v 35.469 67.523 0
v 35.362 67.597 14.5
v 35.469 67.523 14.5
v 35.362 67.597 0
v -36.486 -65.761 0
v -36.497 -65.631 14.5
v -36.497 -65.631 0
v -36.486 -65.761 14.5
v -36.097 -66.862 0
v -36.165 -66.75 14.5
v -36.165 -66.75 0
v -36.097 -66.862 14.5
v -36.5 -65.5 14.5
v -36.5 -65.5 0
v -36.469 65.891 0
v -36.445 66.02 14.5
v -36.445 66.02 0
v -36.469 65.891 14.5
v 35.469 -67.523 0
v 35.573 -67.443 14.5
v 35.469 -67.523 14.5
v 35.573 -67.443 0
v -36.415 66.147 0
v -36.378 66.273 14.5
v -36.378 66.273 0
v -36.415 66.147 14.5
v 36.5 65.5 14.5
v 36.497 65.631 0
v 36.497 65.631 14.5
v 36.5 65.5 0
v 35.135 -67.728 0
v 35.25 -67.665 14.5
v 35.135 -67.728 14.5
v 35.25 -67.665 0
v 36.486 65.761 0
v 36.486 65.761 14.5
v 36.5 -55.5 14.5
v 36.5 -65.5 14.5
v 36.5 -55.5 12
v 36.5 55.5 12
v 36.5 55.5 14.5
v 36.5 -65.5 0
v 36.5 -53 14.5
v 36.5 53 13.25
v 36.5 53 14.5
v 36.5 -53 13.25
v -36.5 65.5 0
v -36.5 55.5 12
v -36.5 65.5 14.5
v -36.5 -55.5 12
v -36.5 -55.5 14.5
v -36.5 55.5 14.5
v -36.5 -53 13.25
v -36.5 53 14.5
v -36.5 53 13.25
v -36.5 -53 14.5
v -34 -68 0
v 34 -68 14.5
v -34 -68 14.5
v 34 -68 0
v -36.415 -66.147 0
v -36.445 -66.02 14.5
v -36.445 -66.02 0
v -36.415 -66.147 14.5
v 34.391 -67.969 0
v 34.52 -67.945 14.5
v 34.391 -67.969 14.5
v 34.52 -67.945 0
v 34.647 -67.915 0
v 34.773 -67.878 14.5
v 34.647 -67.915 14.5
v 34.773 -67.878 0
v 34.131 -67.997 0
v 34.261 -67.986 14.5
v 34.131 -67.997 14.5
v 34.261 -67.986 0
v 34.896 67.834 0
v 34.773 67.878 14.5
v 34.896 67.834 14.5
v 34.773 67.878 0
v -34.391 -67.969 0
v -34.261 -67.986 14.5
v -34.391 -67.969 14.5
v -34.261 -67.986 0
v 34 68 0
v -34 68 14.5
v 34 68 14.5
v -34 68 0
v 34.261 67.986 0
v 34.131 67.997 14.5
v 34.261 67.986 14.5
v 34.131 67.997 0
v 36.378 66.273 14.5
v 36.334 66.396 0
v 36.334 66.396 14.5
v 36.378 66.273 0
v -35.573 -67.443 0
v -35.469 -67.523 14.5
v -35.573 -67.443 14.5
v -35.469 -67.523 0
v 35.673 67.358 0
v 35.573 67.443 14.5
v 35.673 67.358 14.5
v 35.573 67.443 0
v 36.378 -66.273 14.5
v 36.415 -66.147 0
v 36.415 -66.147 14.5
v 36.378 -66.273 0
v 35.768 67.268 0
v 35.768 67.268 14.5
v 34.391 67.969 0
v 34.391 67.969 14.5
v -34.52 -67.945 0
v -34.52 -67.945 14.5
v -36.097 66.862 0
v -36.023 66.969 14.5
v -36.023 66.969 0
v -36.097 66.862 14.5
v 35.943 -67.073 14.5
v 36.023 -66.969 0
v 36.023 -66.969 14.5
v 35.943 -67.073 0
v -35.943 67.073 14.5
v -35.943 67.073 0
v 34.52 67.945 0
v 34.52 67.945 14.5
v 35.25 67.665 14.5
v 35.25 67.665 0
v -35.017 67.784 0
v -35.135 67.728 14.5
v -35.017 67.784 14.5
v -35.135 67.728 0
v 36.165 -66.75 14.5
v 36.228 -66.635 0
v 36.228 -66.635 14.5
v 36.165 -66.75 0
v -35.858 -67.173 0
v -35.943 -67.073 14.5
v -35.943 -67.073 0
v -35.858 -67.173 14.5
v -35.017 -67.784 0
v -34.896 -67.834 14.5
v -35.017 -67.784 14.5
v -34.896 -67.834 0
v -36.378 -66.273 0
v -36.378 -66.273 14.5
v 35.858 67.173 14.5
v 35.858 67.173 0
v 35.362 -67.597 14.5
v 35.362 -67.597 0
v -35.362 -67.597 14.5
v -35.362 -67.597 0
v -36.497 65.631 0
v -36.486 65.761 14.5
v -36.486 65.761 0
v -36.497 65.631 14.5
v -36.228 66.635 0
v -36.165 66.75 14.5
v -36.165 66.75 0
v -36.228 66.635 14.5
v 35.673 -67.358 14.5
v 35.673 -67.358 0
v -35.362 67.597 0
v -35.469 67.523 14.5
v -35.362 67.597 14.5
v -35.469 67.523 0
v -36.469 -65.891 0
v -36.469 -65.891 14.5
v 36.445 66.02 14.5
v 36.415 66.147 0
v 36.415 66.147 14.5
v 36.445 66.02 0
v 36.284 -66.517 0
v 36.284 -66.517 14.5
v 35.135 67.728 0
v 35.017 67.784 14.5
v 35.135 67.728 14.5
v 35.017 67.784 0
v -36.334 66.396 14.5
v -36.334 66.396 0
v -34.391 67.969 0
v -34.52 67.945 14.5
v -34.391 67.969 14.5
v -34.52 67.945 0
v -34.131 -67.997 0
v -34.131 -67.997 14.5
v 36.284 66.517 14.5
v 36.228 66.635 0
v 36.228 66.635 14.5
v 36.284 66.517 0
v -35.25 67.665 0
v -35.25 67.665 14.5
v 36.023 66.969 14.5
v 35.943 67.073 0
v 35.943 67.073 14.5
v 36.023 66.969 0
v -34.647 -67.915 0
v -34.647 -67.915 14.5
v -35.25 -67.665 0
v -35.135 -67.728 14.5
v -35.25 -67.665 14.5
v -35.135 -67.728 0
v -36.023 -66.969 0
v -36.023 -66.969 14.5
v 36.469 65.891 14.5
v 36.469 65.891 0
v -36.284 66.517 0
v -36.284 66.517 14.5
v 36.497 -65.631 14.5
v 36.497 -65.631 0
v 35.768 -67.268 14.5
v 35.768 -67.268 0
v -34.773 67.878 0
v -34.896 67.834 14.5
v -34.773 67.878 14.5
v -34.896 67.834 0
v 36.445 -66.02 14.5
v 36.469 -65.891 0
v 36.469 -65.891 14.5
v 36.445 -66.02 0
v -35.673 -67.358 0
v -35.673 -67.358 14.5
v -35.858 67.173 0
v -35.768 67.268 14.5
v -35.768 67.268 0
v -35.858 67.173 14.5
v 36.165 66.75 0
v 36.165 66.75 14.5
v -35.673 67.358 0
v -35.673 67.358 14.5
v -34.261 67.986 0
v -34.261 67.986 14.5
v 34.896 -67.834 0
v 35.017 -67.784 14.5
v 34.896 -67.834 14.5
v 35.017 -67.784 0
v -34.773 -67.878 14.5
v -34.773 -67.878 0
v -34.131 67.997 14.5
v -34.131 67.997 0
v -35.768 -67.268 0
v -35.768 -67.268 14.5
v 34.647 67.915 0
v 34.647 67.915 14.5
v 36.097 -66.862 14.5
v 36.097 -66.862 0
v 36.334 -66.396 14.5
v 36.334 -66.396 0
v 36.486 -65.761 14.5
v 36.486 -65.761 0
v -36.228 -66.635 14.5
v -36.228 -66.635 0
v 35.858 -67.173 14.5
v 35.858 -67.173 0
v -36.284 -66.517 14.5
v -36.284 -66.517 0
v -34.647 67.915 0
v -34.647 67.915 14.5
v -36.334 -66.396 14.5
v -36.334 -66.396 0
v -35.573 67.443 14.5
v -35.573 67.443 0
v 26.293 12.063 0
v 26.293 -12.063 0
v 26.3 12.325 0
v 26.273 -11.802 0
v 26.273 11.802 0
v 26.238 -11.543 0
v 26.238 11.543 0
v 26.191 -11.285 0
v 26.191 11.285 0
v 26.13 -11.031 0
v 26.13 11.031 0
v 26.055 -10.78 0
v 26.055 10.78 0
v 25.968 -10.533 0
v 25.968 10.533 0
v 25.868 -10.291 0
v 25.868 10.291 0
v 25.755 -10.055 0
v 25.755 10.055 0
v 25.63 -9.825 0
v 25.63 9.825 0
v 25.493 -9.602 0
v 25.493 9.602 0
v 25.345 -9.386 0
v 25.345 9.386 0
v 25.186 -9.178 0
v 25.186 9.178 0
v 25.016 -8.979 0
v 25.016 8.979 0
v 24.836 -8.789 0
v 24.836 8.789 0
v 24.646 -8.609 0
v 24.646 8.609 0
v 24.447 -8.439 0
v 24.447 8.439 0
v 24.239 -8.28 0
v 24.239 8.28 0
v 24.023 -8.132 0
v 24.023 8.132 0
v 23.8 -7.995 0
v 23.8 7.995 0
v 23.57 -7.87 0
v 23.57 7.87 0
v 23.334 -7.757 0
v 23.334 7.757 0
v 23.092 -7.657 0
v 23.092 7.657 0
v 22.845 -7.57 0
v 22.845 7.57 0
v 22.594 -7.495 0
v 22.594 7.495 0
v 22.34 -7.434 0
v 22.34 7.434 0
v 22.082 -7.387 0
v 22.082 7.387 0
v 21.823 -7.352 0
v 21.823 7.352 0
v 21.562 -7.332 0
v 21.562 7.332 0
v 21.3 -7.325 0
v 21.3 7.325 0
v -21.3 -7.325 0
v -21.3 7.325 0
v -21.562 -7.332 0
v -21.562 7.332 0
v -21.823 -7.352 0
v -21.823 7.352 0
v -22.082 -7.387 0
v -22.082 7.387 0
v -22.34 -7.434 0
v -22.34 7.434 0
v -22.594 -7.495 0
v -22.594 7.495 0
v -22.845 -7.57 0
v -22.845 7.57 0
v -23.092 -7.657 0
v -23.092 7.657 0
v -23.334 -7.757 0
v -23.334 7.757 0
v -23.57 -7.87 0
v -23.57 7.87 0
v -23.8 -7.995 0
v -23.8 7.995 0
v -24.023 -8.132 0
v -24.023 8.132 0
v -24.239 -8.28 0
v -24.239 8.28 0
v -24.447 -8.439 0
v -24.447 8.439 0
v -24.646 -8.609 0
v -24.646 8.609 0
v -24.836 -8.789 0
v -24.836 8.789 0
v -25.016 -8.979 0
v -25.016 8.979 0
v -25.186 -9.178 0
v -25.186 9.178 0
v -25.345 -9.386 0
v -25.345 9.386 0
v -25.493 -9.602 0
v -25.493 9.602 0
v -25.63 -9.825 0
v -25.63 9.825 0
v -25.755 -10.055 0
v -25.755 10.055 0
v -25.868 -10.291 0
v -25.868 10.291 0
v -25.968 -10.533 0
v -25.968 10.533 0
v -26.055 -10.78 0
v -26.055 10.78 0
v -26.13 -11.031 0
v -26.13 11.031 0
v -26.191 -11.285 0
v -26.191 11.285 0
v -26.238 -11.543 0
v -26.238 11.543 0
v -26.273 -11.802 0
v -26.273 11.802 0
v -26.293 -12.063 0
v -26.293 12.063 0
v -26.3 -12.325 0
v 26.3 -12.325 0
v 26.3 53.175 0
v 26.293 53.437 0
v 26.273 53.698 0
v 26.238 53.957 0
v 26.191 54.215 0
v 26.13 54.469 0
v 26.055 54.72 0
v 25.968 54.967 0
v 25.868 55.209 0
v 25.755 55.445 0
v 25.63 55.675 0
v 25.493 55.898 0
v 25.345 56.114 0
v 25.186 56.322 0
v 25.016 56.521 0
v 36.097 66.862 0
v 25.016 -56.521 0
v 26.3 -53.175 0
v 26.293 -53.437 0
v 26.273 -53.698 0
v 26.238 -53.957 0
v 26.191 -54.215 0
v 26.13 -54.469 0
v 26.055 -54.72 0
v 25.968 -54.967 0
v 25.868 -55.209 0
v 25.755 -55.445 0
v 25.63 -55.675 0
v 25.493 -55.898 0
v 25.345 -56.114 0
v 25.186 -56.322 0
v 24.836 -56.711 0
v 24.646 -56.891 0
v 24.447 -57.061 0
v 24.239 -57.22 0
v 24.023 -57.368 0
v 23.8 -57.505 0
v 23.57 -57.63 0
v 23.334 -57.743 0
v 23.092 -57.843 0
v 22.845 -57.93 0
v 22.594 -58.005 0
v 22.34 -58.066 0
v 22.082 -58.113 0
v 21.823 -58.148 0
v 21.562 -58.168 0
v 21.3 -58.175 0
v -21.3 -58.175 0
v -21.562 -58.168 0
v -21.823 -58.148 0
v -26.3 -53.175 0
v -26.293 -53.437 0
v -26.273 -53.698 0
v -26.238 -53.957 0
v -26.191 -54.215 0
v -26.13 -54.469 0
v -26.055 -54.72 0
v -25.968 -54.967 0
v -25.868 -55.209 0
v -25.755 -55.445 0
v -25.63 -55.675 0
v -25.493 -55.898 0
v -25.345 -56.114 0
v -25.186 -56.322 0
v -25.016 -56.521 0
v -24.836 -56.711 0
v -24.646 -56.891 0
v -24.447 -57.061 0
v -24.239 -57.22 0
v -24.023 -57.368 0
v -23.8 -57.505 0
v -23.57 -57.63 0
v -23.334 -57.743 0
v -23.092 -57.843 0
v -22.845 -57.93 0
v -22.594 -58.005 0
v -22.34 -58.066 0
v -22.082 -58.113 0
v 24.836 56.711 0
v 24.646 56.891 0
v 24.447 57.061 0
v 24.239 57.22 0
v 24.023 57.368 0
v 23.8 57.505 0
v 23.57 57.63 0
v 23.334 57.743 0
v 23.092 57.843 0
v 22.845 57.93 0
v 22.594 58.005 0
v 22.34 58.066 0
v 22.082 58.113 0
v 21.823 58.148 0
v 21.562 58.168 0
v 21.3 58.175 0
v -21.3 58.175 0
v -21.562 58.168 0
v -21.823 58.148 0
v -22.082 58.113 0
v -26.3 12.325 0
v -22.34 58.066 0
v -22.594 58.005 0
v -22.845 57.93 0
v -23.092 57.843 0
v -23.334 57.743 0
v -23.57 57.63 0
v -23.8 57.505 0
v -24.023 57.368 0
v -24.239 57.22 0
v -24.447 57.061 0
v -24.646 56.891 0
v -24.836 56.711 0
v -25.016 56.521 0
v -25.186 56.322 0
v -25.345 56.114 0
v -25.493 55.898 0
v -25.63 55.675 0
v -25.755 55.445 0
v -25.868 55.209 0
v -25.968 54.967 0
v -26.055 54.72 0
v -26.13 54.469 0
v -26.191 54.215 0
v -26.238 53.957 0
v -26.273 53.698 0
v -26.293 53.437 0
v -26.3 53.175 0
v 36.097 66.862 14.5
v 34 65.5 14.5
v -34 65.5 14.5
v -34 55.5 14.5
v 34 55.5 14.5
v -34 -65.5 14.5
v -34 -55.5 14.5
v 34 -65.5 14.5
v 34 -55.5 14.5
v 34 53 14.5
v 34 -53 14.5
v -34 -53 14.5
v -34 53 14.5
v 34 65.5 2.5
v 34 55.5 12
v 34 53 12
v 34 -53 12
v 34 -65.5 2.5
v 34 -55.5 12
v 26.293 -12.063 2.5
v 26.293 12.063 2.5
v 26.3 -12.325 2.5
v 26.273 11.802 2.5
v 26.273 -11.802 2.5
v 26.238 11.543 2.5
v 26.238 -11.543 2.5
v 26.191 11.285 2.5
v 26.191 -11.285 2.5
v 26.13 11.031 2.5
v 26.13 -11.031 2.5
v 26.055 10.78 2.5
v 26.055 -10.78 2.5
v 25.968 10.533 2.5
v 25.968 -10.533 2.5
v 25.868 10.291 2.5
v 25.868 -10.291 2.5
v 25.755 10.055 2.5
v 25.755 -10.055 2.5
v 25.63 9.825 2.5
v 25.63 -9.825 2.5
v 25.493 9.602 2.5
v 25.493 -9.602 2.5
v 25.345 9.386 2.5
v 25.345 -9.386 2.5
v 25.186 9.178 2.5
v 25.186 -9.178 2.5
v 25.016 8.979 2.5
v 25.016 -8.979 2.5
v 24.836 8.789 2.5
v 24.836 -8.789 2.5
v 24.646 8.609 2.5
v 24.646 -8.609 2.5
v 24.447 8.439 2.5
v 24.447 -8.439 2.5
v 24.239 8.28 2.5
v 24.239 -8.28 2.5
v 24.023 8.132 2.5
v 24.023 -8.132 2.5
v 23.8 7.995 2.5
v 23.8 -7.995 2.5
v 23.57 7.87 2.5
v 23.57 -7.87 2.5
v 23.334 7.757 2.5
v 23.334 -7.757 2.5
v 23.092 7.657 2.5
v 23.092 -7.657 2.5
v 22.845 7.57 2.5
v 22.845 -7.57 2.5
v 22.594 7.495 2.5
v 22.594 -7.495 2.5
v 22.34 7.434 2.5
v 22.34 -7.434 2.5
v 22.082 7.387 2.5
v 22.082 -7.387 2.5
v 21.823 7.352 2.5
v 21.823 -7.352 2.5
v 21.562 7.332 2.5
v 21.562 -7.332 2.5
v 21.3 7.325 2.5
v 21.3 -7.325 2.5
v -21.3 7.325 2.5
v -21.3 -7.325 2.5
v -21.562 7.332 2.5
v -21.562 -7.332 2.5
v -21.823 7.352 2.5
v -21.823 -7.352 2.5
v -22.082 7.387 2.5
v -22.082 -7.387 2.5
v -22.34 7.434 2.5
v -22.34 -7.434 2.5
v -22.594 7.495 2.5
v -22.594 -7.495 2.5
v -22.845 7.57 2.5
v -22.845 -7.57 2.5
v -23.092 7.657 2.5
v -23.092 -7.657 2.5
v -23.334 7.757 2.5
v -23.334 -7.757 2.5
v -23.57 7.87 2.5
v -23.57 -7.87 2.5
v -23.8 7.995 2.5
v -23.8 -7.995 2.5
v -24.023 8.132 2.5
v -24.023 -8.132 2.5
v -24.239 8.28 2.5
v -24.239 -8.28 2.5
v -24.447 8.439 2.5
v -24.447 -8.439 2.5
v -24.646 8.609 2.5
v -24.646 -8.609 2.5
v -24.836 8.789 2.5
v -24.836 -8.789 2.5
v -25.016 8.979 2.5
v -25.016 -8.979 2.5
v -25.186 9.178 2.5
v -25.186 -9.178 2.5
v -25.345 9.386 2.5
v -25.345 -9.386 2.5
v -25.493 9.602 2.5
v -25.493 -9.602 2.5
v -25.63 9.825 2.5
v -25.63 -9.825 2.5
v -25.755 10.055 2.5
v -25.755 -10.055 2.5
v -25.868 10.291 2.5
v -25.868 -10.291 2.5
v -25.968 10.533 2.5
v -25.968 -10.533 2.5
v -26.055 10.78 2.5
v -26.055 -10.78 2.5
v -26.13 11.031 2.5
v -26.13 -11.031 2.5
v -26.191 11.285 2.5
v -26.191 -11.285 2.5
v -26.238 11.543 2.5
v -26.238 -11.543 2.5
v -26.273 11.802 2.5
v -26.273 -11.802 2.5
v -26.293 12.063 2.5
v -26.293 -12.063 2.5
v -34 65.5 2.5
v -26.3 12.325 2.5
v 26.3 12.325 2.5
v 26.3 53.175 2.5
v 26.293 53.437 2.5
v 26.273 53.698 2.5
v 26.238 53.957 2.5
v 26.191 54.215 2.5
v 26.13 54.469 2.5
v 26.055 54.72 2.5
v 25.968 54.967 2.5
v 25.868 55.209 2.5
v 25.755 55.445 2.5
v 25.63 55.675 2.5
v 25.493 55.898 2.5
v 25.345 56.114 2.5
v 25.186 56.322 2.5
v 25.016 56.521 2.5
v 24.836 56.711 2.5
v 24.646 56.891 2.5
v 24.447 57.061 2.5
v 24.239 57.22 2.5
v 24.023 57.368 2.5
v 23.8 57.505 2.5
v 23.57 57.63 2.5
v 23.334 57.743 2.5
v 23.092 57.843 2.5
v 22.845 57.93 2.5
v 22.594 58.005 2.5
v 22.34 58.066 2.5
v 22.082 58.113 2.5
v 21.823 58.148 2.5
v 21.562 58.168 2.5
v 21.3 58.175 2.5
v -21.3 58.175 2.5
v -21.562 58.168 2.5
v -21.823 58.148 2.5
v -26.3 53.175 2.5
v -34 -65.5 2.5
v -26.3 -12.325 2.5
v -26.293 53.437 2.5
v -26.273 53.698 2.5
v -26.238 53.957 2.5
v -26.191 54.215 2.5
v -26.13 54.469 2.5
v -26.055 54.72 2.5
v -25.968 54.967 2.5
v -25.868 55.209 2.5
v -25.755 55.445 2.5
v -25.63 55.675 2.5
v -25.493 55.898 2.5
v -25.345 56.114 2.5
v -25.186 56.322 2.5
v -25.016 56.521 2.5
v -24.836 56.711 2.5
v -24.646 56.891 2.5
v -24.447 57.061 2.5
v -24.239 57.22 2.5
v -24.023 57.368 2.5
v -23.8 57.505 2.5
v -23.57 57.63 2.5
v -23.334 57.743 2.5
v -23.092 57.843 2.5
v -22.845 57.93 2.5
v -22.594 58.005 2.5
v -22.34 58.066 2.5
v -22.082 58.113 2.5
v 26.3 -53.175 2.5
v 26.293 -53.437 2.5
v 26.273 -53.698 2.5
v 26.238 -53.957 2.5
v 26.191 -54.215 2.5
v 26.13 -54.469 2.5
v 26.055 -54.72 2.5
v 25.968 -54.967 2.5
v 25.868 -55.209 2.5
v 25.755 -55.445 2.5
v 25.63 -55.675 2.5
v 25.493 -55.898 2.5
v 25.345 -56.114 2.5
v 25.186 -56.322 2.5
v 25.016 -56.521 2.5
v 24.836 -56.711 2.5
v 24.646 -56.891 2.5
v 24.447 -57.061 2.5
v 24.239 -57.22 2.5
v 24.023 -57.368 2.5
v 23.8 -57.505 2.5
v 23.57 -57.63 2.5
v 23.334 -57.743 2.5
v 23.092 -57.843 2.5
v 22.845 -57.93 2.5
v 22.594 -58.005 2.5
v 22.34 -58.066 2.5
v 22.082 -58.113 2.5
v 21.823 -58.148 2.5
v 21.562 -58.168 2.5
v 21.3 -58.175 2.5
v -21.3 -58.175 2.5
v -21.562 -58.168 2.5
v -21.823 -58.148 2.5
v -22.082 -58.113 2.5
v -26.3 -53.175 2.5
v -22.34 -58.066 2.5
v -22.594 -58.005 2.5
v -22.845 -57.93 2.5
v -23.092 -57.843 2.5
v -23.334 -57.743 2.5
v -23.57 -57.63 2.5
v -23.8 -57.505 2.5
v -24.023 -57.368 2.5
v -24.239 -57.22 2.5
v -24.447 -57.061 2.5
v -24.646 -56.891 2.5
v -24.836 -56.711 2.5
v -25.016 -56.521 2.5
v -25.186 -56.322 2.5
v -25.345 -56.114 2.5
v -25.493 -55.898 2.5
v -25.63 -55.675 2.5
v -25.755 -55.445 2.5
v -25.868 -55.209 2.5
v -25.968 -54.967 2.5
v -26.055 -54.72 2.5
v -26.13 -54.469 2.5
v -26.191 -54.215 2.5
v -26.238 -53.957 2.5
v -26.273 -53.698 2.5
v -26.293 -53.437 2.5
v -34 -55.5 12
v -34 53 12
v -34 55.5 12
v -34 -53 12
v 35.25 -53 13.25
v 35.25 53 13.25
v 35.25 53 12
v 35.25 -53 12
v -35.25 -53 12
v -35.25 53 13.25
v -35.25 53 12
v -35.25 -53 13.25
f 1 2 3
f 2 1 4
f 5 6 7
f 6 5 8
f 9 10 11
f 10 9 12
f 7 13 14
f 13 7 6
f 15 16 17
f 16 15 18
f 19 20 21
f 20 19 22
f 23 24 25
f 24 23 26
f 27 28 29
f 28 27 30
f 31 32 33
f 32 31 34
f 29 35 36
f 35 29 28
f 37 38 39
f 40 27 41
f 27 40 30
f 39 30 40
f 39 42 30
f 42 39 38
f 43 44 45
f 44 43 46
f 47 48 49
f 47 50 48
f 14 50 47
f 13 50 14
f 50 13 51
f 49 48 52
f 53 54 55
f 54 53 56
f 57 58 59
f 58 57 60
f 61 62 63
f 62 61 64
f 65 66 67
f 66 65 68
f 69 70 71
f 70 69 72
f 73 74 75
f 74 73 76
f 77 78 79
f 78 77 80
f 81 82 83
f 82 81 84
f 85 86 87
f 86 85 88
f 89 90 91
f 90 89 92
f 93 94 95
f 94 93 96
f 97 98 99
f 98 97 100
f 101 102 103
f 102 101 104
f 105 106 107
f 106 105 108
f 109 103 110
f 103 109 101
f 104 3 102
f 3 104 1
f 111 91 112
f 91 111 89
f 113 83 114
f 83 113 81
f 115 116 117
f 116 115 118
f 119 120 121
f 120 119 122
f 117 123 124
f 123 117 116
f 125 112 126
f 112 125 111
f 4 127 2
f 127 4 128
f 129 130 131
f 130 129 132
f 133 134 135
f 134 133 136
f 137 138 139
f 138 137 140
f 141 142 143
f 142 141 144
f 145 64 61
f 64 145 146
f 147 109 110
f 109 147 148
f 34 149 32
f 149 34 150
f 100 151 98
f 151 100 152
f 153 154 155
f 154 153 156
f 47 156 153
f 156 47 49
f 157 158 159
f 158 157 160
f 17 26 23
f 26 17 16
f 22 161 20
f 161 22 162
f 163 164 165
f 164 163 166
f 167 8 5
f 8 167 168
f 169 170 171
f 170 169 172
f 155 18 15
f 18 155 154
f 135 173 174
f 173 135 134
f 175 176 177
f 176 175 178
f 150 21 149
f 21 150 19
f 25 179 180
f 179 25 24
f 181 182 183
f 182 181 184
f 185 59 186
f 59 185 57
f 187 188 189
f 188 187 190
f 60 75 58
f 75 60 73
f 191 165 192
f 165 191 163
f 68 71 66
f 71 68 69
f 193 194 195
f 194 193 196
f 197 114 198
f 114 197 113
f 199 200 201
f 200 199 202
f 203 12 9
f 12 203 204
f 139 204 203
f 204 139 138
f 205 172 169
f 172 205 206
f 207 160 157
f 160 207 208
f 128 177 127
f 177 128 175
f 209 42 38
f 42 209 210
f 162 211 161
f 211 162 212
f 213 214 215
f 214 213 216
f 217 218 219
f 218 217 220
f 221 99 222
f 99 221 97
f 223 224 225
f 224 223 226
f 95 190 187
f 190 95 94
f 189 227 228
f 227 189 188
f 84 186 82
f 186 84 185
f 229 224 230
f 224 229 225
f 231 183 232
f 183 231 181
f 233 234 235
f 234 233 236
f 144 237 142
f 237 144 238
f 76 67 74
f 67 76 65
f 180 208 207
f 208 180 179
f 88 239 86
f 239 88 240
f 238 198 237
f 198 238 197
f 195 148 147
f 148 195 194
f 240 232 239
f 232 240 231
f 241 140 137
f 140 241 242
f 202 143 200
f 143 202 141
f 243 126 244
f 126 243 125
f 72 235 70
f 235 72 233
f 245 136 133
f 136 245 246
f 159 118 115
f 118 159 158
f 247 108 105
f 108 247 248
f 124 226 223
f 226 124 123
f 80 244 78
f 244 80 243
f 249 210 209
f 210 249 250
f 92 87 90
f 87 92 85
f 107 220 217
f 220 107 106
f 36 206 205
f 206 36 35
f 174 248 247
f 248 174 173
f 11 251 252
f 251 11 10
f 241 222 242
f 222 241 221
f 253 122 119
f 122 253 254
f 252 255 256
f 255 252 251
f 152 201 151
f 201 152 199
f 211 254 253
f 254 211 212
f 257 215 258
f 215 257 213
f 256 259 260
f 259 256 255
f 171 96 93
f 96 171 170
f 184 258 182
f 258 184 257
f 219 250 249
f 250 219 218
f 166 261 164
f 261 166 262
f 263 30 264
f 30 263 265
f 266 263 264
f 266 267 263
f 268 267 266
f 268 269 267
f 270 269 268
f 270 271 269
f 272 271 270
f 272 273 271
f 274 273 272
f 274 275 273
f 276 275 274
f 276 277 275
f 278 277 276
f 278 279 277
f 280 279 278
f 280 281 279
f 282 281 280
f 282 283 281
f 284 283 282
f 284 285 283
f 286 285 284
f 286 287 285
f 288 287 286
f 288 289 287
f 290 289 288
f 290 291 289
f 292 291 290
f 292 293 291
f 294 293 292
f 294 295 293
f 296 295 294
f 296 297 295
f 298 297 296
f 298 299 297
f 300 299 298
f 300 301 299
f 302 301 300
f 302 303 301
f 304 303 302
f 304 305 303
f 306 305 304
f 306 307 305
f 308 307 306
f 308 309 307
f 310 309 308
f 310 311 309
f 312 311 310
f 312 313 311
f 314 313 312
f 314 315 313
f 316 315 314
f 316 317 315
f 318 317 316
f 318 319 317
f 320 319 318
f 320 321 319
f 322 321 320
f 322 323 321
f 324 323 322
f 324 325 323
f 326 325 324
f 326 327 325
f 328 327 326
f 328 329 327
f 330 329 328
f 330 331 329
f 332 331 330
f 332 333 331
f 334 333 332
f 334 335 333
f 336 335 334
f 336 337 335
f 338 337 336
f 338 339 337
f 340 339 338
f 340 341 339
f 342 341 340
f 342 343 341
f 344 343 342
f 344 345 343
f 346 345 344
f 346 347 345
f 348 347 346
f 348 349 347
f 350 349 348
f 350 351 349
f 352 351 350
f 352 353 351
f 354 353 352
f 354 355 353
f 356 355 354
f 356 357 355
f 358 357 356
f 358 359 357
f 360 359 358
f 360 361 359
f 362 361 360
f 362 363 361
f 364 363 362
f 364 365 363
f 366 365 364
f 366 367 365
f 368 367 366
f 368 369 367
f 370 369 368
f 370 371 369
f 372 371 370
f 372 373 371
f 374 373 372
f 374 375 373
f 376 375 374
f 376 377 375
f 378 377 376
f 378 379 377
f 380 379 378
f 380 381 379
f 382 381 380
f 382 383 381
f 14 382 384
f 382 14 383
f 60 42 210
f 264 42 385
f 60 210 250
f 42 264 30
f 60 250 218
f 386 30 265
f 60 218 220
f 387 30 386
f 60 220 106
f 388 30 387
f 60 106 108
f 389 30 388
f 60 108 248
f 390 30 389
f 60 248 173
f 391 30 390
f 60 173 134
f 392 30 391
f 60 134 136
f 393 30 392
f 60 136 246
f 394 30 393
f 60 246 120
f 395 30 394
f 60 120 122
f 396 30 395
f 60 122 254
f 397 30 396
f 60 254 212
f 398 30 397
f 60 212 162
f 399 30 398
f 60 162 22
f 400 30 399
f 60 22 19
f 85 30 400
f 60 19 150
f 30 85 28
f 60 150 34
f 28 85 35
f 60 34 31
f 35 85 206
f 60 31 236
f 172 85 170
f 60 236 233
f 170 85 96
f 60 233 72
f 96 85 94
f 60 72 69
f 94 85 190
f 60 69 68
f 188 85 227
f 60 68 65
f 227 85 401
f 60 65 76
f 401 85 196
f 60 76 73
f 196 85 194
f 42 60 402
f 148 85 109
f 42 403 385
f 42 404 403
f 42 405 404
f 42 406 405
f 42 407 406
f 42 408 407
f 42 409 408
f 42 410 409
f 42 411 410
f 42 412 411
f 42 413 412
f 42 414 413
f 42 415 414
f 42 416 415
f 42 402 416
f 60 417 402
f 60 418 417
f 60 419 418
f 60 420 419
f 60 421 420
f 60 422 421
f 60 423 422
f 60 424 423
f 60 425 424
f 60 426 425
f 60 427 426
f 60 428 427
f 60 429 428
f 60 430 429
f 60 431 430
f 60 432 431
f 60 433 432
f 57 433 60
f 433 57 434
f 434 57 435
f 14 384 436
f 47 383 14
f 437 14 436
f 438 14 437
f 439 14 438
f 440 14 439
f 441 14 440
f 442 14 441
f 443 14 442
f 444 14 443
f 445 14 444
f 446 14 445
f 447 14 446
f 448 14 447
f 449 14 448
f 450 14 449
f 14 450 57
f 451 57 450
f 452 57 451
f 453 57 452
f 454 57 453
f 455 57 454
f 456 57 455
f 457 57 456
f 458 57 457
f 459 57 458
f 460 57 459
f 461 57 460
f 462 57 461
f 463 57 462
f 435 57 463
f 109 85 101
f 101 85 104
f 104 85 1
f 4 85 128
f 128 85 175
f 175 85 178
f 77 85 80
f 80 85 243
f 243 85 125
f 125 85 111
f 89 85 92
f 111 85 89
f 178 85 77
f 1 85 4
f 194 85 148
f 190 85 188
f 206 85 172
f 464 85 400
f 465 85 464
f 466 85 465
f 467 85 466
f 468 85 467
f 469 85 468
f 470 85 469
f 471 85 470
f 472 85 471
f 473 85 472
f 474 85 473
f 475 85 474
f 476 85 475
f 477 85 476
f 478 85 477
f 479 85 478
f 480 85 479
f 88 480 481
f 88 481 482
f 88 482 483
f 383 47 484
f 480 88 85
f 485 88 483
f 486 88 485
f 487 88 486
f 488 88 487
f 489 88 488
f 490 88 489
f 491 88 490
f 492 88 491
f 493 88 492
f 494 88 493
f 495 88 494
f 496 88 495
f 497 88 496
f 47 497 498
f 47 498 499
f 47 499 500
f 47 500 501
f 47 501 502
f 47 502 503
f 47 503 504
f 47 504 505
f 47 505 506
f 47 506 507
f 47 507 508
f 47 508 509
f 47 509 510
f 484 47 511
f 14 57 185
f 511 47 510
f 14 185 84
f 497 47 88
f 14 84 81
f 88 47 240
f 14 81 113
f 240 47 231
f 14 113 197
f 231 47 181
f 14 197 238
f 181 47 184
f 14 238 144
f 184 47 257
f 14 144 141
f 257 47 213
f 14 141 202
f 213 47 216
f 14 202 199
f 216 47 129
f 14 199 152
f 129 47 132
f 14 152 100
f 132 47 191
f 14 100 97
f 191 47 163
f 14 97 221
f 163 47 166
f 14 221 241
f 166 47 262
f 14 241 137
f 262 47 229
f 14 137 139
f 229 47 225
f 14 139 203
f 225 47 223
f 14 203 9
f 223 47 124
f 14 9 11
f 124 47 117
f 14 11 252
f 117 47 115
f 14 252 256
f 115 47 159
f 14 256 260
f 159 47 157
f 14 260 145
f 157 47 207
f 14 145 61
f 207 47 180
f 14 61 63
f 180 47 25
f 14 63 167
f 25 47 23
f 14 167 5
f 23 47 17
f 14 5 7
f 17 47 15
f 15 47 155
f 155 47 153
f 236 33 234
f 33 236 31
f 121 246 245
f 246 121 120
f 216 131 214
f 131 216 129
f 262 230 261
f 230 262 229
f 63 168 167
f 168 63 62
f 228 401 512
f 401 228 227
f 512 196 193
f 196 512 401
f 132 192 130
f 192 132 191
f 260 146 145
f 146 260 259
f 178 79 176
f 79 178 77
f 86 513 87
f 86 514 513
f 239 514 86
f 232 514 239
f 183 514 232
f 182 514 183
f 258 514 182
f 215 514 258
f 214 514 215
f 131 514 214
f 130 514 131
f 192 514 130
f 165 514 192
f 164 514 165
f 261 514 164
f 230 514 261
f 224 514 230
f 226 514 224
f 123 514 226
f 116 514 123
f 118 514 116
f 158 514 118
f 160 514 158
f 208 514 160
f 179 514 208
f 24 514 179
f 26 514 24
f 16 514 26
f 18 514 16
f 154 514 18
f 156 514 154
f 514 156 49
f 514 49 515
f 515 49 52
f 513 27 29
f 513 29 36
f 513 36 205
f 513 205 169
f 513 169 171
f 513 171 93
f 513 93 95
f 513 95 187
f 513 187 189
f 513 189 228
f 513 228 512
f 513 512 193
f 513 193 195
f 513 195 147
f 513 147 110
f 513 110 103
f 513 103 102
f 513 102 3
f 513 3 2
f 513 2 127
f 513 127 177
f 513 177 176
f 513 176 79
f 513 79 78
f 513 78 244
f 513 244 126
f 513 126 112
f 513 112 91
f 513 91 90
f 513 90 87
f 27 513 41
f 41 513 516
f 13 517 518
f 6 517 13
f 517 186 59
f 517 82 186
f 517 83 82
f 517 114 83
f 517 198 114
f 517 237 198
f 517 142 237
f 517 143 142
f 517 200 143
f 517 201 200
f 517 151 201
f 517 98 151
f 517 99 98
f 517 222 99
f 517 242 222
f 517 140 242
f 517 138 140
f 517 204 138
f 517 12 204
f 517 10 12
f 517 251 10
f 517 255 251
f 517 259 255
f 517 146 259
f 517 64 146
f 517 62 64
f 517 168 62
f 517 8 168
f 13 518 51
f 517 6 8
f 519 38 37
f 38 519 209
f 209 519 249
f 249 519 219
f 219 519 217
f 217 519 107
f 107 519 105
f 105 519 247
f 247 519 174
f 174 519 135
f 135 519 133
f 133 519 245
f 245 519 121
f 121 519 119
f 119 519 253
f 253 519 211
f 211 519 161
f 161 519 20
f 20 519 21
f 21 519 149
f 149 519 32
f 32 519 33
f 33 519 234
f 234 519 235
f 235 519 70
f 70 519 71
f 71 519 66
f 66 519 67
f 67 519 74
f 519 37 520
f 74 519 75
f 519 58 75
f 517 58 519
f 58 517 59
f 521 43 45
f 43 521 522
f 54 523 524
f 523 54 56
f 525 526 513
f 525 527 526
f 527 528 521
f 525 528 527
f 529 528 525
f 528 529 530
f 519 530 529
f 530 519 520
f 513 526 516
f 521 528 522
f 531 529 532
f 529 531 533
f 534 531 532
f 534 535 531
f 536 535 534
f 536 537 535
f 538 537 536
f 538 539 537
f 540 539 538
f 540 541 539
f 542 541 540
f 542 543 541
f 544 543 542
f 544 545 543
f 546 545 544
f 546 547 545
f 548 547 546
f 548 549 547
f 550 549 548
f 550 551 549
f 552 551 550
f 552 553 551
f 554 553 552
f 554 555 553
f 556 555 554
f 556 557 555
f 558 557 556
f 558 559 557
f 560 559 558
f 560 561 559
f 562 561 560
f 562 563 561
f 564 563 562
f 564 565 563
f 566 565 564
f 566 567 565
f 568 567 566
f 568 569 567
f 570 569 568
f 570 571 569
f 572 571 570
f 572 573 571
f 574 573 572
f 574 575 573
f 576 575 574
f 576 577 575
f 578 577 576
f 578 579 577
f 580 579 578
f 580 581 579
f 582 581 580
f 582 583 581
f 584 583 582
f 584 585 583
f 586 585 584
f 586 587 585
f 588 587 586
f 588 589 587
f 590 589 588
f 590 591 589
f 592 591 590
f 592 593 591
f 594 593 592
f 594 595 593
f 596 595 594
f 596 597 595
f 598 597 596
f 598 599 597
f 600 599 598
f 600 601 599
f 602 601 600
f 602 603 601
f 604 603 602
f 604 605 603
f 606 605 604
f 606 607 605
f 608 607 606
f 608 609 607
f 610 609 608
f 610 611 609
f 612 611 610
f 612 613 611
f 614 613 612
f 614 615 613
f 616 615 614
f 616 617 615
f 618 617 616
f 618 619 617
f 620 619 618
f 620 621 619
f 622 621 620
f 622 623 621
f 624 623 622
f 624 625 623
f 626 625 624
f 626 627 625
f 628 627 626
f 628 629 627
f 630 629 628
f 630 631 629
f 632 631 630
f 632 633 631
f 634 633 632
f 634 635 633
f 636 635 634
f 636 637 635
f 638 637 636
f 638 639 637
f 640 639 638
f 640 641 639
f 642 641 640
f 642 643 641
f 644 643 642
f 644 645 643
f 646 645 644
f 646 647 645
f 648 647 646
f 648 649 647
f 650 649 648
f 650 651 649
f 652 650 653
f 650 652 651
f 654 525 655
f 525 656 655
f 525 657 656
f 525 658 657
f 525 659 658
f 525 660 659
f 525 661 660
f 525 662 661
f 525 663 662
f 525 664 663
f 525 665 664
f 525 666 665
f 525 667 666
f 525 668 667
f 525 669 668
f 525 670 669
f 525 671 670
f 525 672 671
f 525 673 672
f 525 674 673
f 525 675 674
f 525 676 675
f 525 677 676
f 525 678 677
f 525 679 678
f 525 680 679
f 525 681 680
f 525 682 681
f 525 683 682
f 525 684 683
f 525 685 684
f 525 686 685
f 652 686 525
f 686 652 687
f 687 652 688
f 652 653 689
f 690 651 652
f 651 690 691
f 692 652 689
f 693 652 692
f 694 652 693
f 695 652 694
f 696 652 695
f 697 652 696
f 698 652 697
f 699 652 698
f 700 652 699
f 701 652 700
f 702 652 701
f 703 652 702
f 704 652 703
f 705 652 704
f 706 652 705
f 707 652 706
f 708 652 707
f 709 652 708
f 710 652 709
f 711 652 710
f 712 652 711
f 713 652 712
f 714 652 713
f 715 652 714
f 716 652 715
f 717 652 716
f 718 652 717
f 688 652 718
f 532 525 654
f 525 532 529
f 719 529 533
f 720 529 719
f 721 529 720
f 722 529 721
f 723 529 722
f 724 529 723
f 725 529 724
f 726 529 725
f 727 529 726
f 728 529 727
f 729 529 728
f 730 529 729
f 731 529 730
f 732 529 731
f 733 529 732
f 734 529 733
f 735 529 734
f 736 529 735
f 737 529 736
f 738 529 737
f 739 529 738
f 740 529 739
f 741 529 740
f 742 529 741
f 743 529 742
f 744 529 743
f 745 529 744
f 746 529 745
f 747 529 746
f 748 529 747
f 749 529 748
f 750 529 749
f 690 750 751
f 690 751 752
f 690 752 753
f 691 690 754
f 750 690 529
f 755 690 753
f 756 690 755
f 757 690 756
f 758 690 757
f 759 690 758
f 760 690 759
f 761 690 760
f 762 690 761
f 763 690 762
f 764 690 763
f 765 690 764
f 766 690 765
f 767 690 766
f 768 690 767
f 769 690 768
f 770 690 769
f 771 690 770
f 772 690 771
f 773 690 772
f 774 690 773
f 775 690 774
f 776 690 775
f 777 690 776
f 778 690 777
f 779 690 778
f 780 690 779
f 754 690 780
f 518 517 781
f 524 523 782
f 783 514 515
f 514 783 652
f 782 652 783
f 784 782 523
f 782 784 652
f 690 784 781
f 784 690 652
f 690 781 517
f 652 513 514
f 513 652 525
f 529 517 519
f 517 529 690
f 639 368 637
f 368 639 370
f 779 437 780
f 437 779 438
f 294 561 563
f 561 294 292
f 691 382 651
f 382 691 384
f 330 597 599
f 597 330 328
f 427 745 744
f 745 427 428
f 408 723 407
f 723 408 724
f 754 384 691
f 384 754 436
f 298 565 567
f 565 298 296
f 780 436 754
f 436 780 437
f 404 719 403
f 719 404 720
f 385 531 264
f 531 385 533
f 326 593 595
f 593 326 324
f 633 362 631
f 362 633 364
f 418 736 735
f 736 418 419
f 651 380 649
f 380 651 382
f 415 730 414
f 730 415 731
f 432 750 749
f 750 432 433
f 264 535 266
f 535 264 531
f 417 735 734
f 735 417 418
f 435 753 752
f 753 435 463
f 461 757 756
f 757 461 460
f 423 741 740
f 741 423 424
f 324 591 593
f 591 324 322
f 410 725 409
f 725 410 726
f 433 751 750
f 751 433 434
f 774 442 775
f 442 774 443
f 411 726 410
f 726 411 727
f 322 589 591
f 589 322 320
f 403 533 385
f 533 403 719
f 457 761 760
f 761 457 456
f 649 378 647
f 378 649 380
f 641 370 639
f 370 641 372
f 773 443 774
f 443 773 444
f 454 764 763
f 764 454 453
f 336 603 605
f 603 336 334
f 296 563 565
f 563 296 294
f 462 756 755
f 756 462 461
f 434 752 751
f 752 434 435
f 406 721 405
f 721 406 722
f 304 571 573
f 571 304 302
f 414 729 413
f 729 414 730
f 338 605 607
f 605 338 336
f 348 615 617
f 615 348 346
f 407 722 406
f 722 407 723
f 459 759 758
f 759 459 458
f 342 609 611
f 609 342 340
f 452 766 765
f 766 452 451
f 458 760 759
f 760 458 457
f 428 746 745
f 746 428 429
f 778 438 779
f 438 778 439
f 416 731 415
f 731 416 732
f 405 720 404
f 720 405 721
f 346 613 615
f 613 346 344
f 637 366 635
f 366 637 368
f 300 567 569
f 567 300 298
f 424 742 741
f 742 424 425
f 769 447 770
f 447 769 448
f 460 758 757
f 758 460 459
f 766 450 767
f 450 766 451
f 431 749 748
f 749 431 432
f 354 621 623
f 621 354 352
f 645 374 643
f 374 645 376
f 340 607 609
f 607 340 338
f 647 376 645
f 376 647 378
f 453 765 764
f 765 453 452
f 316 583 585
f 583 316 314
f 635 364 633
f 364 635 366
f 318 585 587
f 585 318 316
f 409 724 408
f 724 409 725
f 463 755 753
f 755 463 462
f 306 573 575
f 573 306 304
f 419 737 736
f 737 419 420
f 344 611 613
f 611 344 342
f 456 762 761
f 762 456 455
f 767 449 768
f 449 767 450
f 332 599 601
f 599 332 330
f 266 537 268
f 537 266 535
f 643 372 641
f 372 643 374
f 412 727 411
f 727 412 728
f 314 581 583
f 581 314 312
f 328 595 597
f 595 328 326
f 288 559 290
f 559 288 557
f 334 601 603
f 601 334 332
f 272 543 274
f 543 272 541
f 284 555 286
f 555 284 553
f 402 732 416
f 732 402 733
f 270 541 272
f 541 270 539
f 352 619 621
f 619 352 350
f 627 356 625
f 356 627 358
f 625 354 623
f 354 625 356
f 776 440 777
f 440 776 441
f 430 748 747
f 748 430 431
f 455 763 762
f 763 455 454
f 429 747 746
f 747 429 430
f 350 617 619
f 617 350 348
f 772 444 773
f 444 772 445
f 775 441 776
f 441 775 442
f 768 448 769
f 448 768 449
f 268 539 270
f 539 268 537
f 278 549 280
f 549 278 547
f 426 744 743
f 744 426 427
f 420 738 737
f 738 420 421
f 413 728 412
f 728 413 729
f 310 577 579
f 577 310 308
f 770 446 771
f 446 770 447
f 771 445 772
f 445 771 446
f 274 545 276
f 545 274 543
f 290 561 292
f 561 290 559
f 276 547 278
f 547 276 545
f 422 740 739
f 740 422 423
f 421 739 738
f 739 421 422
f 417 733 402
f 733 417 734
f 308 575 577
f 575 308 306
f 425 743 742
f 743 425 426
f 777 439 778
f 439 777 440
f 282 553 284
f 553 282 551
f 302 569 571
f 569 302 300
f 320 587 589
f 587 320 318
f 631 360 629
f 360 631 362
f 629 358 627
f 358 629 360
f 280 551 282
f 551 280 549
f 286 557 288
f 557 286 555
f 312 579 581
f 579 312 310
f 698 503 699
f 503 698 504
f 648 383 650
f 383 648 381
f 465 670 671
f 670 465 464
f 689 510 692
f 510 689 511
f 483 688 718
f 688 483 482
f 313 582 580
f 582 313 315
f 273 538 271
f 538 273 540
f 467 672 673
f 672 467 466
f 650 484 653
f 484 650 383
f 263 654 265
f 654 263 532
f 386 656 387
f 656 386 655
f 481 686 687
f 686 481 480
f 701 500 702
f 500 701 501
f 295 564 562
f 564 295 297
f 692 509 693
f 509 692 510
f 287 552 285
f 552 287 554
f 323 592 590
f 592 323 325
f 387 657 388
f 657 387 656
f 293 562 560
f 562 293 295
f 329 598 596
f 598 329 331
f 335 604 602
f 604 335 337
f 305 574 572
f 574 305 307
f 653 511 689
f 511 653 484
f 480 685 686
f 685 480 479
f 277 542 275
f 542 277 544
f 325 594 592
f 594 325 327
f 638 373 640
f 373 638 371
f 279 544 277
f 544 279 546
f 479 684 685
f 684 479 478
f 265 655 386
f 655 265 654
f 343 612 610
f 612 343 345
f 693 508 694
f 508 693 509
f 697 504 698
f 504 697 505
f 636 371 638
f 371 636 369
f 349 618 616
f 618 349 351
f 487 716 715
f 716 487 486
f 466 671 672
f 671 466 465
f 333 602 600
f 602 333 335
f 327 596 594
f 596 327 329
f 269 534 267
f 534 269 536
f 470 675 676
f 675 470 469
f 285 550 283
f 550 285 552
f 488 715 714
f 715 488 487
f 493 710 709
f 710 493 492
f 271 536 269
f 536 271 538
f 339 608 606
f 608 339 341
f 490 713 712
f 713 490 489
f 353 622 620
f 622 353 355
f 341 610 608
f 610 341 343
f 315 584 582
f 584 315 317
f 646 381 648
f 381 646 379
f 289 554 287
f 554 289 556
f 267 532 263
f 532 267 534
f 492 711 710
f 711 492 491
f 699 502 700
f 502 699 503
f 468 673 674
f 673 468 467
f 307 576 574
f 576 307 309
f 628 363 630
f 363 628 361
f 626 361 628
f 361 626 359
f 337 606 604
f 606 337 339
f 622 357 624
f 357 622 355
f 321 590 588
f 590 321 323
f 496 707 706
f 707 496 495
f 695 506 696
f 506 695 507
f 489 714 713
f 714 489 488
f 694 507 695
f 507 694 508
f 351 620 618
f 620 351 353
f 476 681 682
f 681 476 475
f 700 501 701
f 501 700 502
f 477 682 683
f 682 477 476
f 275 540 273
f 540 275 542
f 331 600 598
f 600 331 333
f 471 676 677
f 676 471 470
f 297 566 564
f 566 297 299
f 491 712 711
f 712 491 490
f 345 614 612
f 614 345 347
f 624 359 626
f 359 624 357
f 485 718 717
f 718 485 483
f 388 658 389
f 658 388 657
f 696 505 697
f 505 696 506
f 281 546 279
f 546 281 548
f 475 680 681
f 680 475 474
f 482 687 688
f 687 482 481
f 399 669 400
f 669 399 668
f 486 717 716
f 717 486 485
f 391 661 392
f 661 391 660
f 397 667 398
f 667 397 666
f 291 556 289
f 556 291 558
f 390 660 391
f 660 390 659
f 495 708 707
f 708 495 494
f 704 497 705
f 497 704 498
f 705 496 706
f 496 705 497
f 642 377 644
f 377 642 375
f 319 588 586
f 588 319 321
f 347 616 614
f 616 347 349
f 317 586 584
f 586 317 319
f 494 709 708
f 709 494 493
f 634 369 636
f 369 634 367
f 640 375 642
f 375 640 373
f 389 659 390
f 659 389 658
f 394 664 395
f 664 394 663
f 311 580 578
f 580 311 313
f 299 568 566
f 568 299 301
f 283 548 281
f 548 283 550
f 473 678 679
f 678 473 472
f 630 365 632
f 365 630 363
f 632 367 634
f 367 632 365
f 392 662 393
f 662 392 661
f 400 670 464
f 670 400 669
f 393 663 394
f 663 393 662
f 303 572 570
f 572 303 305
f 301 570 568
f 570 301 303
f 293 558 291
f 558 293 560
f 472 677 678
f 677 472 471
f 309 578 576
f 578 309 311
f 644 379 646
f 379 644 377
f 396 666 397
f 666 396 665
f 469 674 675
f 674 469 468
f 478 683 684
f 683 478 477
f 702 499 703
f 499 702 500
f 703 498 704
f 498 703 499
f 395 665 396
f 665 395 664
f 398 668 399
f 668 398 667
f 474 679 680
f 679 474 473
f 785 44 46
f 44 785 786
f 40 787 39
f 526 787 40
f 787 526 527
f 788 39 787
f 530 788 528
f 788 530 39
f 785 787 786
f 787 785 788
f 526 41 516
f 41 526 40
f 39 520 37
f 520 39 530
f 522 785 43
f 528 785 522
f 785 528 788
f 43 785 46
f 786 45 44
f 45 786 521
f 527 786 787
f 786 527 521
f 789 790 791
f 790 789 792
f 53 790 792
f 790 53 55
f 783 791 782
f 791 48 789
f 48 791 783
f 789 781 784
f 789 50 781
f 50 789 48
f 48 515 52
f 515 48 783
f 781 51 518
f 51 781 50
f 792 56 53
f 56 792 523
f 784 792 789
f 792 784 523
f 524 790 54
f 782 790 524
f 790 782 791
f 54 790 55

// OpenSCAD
part = "frame"; // [base:Support base,frame:Support frame]

// Cellphone Width (Moto G, 68mm)
width = 68; // [1:150]

// Cellphone Height (Moto G, 131mm)
height= 131; // [1:200]

// Cellphone Depth (Moto G, 12mm)
depth = 12; // [1:100]

// Border Thickness
border_thickness=2.5; // [2:0.5:10]

/* [Hidden] */

$fn=120;

print_part();

module print_part() {
	if (part == "base") {
		base(width);
	} else if (part == "frame") {
        box(width,height,depth,border_thickness);
	}
}

module frame(width, height, depth, border)
{   
    difference()
    {
        roundedRect([width+border,height+border,depth+border],border);

        translate([0,0,(depth/2)+border])
        cube([width,height,depth],center=true);        
    }
}

module sideStuff(width, height, depth, border)
{
            translate([(width/2)+border*0.75,0,depth+border*0.25])
            cube([border/2,height-20,border/2],center=true);

            translate([(width/2)+border/2,-(height-(20+border))/2,depth+border/2])
            cube([border,border,border],center=true);

            translate([(width/2)+border/2,(height-(20+border))/2,depth+border/2])
            cube([border,border,border],center=true);

            translate([-((width/2)+border*0.75),0,depth+border*0.25])
            cube([border/2,height-20,border/2],center=true);

            translate([-((width/2)+border/2),-(height-(20+border))/2,depth+border/2])
            cube([border,border,border],center=true);

            translate([-((width/2)+border/2),(height-(20+border))/2,depth+border/2])
            cube([border,border,border],center=true);

}

// size - [x,y,z]
// radius - radius of corners
module roundedRect(size, radius)
{
	x = size[0];
	y = size[1];
	z = size[2];

	linear_extrude(height=z)
	hull()
	{
		// place 4 circles in the corners, with the given radius
		translate([(-x/2)+(radius/2), (-y/2)+(radius/2), 0])
		circle(r=radius);
	
		translate([(x/2)-(radius/2), (-y/2)+(radius/2), 0])
		circle(r=radius);
	
		translate([(-x/2)+(radius/2), (y/2)-(radius/2), 0])
		circle(r=radius);
	
		translate([(x/2)-(radius/2), (y/2)-(radius/2), 0])
		circle(r=radius);
	}
}


module innerHoles(width, height, depth, border)
{
            translate([0,-height/4,0])
            roundedRect([width*0.7,height*0.35,depth+border],5);

            translate([0,height/4,0])
            roundedRect([width*0.7,height*0.35,depth+border],5);
}

module box(width, height, depth, border)
{
    difference()
    {
        frame(width, height, depth, border);
        union()
        {
            innerHoles(width, height, depth, border);
            sideStuff(width, height, depth, border);
        }
    }
}


module base(width)
{
    translate([0,0,-5])
    {        
        rotate([0,0,90])
        difference()
        {
        cube([30,width,10],center=true);
            union()
            {
                translate([0,0,-29])
                    rotate([90,90,0])
                        cylinder(h=width,r=30,center=true);            
                translate([0,0,3])
                cube([30,27,3], center=true);
            }
        }
    }
}
